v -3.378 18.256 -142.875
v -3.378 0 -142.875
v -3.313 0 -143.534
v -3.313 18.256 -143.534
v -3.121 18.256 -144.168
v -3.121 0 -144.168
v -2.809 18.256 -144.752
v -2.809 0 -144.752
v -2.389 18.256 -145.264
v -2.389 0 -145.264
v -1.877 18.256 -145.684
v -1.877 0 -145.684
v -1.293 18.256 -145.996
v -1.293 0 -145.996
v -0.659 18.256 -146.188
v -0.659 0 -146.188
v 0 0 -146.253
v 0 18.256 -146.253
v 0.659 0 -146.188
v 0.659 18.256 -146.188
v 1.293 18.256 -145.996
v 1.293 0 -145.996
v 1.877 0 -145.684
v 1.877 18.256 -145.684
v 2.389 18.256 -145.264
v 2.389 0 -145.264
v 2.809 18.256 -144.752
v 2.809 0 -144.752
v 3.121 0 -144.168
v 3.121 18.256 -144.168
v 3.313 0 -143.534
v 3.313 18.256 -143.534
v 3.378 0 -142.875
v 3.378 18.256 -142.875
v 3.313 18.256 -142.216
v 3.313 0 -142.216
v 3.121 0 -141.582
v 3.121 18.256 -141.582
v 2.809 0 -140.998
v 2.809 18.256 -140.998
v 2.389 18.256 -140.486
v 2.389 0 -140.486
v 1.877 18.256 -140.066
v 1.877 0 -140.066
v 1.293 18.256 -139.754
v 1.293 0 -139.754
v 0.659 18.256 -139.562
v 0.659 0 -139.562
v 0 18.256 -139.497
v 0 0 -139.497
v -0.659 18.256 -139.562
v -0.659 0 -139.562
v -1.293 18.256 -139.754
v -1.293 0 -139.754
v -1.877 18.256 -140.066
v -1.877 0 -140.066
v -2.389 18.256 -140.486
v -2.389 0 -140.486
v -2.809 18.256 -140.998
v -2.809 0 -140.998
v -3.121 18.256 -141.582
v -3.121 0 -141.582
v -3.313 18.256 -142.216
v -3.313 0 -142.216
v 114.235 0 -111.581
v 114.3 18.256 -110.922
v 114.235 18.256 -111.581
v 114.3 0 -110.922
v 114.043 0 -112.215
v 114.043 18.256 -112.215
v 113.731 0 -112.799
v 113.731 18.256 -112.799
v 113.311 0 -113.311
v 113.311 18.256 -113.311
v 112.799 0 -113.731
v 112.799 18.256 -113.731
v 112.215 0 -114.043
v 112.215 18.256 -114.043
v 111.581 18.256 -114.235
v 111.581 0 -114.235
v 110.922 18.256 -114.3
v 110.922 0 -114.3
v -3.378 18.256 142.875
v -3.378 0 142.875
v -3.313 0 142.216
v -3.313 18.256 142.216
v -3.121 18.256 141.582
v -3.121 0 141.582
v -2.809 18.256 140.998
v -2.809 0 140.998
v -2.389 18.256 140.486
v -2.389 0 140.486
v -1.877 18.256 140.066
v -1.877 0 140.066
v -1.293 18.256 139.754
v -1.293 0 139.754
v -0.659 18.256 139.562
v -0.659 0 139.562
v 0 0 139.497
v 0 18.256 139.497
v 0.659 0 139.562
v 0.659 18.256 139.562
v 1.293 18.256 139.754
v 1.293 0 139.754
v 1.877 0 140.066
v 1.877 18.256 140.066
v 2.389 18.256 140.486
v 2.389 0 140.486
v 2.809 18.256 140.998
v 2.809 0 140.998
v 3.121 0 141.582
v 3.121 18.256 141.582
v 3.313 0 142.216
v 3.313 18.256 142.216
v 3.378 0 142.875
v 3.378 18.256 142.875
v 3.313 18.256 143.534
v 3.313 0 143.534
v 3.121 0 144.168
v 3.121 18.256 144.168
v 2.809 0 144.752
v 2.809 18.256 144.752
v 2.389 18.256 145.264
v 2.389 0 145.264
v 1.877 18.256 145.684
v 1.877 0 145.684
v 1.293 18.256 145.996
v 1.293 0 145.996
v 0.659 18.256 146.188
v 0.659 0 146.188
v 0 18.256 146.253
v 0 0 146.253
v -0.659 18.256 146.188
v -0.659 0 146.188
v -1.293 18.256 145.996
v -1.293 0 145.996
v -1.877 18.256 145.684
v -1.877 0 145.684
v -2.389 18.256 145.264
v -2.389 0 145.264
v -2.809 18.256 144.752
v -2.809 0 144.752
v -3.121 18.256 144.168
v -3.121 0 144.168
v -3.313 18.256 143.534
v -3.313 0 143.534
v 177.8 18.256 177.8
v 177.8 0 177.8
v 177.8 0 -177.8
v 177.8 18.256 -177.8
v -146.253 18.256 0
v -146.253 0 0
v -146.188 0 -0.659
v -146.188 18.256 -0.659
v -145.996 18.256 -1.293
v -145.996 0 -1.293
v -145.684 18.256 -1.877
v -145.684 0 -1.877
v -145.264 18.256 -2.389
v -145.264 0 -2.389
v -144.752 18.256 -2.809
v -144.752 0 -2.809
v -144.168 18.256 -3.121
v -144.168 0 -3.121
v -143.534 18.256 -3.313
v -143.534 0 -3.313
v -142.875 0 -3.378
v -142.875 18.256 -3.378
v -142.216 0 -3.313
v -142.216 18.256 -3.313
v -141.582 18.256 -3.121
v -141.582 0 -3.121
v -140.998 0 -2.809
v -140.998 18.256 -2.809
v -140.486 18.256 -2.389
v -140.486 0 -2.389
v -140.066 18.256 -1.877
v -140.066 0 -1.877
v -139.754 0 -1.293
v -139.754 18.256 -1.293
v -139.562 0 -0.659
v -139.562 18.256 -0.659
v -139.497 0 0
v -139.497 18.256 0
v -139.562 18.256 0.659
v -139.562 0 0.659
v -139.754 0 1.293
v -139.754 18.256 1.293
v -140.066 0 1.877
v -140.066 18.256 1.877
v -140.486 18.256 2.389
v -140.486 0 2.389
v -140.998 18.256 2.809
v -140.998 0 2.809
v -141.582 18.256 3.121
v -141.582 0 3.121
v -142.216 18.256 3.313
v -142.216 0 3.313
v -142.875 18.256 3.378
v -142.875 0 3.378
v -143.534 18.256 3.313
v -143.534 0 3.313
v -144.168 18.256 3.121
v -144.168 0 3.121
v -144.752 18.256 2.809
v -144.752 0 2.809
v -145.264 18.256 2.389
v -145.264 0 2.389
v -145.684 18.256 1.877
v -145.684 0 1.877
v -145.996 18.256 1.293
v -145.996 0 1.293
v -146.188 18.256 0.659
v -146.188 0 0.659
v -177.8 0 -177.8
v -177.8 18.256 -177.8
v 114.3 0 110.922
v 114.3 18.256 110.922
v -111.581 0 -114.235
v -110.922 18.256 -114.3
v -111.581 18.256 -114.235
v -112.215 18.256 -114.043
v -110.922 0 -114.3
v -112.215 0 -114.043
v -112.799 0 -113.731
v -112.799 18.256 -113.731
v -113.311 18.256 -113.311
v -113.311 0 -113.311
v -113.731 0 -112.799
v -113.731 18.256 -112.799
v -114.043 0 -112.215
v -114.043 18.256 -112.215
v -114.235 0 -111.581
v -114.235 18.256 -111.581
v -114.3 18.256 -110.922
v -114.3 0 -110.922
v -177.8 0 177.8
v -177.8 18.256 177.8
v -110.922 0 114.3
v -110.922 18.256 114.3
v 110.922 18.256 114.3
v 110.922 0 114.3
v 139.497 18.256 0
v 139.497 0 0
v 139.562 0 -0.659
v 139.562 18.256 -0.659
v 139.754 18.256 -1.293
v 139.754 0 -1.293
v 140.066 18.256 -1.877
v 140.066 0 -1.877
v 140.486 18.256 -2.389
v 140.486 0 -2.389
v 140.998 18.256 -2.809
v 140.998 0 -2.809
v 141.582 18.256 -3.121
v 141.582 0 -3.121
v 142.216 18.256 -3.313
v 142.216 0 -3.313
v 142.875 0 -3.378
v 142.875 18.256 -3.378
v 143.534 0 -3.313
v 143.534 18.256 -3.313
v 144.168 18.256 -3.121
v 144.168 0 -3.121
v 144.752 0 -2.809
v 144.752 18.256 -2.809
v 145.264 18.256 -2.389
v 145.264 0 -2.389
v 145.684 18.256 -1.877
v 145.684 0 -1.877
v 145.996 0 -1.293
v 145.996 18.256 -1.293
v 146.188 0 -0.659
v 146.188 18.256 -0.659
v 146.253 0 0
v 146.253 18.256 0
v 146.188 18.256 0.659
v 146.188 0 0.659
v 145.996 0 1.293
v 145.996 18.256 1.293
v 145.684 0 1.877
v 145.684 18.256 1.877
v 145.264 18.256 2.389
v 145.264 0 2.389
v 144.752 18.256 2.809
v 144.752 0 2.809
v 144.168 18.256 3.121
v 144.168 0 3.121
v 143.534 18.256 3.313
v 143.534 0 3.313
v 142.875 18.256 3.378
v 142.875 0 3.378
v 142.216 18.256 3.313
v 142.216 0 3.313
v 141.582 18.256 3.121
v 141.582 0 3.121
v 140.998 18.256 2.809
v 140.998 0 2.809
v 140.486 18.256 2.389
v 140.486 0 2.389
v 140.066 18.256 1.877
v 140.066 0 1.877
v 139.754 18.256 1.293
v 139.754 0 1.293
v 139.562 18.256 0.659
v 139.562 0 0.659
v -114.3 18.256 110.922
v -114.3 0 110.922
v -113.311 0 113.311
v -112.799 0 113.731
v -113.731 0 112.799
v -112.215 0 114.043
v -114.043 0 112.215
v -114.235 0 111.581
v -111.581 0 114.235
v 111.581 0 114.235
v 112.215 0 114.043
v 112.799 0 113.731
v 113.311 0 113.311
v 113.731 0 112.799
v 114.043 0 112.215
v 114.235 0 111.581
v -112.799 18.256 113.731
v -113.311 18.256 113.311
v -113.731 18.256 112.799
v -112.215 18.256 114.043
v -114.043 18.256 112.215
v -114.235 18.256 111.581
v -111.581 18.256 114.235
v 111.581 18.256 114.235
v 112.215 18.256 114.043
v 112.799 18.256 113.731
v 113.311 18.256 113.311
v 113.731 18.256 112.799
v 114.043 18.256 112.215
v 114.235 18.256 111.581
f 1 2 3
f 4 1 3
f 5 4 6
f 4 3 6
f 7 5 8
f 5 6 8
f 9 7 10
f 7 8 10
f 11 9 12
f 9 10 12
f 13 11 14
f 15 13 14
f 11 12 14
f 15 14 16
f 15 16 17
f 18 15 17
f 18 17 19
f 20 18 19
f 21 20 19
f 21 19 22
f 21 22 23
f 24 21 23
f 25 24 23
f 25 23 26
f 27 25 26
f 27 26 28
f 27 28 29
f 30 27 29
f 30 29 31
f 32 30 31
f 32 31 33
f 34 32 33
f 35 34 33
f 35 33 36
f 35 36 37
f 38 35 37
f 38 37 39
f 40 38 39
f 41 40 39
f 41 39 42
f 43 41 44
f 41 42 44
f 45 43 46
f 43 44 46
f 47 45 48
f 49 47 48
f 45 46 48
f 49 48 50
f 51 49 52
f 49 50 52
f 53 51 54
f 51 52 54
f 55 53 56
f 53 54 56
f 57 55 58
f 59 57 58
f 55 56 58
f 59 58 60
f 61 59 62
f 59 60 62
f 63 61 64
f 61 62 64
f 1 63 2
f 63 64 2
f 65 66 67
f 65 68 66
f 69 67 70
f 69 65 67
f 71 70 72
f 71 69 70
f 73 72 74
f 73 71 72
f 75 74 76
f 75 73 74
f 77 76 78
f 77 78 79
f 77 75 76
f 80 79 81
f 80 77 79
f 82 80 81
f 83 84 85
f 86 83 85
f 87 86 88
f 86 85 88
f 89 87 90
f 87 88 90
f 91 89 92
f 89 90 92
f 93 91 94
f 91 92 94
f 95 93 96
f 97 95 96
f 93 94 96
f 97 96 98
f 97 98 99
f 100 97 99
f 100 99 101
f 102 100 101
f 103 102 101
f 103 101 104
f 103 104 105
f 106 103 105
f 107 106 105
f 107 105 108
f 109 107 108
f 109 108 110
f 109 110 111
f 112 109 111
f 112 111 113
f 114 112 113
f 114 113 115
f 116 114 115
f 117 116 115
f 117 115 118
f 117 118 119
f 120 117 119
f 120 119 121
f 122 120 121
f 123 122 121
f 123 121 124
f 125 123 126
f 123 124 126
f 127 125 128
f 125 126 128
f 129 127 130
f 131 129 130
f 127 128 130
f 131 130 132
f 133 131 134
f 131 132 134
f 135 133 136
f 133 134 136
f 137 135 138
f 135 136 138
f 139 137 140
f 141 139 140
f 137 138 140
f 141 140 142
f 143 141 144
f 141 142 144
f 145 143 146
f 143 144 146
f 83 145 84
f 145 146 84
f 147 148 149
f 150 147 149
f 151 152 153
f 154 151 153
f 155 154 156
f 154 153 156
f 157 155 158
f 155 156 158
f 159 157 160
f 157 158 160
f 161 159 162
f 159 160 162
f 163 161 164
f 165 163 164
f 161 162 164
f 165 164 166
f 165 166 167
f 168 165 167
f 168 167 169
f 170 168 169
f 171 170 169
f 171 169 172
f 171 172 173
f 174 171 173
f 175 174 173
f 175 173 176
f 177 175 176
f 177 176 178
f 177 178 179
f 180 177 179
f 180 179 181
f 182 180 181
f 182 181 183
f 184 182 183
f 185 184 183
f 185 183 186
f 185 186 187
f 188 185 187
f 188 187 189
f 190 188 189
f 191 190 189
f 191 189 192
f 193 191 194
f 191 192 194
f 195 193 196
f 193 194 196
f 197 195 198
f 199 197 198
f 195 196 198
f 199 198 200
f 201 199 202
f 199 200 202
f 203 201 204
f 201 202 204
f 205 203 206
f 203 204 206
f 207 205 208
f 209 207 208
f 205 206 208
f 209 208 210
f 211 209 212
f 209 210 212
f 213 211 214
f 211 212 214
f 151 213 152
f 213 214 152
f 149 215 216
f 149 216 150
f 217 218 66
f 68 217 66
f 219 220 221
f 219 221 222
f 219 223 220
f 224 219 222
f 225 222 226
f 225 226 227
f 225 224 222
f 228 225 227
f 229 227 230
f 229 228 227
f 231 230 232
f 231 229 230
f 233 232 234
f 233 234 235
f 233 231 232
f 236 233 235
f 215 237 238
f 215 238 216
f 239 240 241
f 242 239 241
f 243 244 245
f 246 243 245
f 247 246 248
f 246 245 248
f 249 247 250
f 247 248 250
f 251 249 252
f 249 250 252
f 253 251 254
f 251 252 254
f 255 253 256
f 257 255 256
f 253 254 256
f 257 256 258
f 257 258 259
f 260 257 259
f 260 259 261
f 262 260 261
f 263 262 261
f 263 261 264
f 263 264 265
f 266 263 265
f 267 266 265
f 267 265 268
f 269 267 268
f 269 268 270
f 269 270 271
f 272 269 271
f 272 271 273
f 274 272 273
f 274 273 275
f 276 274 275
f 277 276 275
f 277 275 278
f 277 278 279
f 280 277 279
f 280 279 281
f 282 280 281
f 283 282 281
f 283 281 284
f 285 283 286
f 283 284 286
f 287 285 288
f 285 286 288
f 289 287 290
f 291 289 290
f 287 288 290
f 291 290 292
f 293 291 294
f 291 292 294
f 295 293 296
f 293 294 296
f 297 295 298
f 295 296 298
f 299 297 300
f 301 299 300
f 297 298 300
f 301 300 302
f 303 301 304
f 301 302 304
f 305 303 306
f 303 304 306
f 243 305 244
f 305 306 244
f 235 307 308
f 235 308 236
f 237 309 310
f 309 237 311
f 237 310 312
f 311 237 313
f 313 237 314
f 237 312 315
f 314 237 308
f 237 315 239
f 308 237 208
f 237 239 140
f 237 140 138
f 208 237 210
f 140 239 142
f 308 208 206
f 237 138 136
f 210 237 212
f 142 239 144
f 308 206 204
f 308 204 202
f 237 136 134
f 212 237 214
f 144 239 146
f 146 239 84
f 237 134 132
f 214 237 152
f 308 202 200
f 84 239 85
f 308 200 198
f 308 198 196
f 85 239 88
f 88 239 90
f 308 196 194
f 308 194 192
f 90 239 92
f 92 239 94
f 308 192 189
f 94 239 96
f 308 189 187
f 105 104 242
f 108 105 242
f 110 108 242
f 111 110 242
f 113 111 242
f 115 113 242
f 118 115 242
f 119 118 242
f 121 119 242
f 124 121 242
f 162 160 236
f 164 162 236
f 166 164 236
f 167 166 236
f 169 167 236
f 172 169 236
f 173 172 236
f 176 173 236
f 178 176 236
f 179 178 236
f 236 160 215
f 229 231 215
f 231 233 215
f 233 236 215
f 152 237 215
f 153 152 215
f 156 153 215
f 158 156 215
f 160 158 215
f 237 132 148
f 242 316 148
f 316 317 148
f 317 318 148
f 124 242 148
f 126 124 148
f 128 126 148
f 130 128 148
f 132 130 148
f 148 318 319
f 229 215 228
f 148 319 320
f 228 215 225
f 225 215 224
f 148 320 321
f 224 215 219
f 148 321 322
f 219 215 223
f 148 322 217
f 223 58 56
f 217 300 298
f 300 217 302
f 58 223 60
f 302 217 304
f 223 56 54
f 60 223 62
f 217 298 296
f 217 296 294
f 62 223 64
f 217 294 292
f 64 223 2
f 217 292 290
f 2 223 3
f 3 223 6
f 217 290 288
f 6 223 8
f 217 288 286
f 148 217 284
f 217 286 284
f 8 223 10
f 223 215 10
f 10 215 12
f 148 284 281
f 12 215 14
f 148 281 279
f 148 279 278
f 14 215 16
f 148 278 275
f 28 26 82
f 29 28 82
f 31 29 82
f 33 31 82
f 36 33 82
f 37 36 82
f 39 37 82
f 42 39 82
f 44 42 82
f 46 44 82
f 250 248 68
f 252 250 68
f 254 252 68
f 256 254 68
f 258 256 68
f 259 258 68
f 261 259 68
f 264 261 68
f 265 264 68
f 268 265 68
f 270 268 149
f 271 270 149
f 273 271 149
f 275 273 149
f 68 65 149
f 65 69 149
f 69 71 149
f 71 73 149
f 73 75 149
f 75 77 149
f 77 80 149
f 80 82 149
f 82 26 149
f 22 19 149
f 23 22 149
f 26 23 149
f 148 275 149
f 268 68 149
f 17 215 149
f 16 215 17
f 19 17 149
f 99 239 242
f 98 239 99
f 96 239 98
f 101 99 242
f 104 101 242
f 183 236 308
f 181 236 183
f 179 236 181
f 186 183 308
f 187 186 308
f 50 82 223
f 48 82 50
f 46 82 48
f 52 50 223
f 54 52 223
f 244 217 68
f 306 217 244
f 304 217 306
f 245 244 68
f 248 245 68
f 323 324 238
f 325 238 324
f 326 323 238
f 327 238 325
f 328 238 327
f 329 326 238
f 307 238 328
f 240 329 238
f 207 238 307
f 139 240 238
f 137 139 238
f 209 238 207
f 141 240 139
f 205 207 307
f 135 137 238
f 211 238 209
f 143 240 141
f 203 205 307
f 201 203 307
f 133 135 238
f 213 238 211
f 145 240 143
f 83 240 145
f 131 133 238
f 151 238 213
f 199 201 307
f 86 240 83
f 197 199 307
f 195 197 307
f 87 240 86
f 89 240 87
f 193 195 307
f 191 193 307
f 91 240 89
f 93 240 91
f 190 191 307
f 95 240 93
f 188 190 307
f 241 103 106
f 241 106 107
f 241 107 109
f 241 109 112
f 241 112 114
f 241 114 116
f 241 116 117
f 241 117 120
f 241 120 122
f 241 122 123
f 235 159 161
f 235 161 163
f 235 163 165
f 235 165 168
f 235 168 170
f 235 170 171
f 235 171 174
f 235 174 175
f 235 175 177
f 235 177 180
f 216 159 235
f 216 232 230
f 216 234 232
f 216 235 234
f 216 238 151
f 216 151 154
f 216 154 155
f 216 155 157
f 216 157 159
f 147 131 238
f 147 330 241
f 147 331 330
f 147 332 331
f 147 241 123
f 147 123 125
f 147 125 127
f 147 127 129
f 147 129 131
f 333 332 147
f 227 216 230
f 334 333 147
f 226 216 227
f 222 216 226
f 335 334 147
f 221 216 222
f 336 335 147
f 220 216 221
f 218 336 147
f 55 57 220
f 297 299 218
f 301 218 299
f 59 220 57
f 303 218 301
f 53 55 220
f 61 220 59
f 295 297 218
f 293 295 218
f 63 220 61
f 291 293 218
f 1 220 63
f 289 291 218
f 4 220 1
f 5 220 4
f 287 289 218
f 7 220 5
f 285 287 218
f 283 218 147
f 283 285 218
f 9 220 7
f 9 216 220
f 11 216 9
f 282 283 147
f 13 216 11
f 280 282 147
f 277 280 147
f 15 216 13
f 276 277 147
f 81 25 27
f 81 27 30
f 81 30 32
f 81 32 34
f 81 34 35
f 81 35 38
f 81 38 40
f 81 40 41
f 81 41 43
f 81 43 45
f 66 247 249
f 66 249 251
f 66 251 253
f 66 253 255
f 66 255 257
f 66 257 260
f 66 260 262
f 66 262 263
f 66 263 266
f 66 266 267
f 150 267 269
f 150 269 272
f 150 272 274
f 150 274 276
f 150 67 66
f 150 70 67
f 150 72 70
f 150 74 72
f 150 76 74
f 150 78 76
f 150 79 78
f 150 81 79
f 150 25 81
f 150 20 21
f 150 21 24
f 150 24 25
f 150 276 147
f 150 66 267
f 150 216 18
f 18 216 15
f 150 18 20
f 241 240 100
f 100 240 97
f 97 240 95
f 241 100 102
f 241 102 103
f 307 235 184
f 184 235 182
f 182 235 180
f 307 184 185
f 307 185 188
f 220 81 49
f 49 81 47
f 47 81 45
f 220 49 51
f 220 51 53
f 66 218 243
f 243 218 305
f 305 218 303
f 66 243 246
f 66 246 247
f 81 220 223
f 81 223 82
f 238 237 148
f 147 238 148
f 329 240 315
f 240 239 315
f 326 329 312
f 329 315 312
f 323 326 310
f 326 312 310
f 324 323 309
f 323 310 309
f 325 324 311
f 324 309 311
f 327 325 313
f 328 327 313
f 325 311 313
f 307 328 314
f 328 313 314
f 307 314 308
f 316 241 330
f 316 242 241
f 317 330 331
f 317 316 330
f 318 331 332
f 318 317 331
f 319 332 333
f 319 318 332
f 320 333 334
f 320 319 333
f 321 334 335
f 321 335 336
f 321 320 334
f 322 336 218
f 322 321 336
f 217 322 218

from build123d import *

# Parameters (mm, degrees)
SKETCH1_W               = 355.6
SKETCH1_H               = 355.6
BOSS_EXTRUDE1_DEPTH     = 18.25625
F_1_4_CLEARANCE_HOLE1_D = 6.7564
SKETCH8_W               = 228.6
SKETCH8_H               = 228.6
CUT_EXTRUDE3_DEPTH      = 253.109045185
FILLET2_R               = 3.3782


with BuildPart() as part:
    # Sketch1 → Boss-Extrude1 (new body)
    with BuildSketch(Plane(origin=(0, 0, 0), x_dir=(1, 0, 0), z_dir=(0, 1, 0))):
        Rectangle(SKETCH1_W, SKETCH1_H)
    extrude(amount=BOSS_EXTRUDE1_DEPTH)

    # 1/4 Clearance Hole1 (through all)
    with Locations(Plane(origin=(0, 18.25625, 0), x_dir=(1, 0, 0), z_dir=(0, 1, 0))):
        with Locations((0, 142.875), (-142.875, 0), (0, -142.875), (142.875, 0)):
            Hole(F_1_4_CLEARANCE_HOLE1_D / 2)

    # Sketch8 → Cut-Extrude3 (cut, through all)
    with BuildSketch(Plane(origin=(0, 18.25625, 0), x_dir=(1, 0, 0), z_dir=(0, 1, 0))):
        Rectangle(SKETCH8_W, SKETCH8_H)
    extrude(amount=-CUT_EXTRUDE3_DEPTH, mode=Mode.SUBTRACT)

    # Fillet2
    fillet2_edges = [part.edges().sort_by_distance(p)[0] for p in [
        (-114.3, 9.128125, 114.3),
        (-114.3, 9.128125, -114.3),
        (114.3, 9.128125, -114.3),
        (114.3, 9.128125, 114.3),
    ]]
    fillet(fillet2_edges, radius=FILLET2_R)


solid = part.part
